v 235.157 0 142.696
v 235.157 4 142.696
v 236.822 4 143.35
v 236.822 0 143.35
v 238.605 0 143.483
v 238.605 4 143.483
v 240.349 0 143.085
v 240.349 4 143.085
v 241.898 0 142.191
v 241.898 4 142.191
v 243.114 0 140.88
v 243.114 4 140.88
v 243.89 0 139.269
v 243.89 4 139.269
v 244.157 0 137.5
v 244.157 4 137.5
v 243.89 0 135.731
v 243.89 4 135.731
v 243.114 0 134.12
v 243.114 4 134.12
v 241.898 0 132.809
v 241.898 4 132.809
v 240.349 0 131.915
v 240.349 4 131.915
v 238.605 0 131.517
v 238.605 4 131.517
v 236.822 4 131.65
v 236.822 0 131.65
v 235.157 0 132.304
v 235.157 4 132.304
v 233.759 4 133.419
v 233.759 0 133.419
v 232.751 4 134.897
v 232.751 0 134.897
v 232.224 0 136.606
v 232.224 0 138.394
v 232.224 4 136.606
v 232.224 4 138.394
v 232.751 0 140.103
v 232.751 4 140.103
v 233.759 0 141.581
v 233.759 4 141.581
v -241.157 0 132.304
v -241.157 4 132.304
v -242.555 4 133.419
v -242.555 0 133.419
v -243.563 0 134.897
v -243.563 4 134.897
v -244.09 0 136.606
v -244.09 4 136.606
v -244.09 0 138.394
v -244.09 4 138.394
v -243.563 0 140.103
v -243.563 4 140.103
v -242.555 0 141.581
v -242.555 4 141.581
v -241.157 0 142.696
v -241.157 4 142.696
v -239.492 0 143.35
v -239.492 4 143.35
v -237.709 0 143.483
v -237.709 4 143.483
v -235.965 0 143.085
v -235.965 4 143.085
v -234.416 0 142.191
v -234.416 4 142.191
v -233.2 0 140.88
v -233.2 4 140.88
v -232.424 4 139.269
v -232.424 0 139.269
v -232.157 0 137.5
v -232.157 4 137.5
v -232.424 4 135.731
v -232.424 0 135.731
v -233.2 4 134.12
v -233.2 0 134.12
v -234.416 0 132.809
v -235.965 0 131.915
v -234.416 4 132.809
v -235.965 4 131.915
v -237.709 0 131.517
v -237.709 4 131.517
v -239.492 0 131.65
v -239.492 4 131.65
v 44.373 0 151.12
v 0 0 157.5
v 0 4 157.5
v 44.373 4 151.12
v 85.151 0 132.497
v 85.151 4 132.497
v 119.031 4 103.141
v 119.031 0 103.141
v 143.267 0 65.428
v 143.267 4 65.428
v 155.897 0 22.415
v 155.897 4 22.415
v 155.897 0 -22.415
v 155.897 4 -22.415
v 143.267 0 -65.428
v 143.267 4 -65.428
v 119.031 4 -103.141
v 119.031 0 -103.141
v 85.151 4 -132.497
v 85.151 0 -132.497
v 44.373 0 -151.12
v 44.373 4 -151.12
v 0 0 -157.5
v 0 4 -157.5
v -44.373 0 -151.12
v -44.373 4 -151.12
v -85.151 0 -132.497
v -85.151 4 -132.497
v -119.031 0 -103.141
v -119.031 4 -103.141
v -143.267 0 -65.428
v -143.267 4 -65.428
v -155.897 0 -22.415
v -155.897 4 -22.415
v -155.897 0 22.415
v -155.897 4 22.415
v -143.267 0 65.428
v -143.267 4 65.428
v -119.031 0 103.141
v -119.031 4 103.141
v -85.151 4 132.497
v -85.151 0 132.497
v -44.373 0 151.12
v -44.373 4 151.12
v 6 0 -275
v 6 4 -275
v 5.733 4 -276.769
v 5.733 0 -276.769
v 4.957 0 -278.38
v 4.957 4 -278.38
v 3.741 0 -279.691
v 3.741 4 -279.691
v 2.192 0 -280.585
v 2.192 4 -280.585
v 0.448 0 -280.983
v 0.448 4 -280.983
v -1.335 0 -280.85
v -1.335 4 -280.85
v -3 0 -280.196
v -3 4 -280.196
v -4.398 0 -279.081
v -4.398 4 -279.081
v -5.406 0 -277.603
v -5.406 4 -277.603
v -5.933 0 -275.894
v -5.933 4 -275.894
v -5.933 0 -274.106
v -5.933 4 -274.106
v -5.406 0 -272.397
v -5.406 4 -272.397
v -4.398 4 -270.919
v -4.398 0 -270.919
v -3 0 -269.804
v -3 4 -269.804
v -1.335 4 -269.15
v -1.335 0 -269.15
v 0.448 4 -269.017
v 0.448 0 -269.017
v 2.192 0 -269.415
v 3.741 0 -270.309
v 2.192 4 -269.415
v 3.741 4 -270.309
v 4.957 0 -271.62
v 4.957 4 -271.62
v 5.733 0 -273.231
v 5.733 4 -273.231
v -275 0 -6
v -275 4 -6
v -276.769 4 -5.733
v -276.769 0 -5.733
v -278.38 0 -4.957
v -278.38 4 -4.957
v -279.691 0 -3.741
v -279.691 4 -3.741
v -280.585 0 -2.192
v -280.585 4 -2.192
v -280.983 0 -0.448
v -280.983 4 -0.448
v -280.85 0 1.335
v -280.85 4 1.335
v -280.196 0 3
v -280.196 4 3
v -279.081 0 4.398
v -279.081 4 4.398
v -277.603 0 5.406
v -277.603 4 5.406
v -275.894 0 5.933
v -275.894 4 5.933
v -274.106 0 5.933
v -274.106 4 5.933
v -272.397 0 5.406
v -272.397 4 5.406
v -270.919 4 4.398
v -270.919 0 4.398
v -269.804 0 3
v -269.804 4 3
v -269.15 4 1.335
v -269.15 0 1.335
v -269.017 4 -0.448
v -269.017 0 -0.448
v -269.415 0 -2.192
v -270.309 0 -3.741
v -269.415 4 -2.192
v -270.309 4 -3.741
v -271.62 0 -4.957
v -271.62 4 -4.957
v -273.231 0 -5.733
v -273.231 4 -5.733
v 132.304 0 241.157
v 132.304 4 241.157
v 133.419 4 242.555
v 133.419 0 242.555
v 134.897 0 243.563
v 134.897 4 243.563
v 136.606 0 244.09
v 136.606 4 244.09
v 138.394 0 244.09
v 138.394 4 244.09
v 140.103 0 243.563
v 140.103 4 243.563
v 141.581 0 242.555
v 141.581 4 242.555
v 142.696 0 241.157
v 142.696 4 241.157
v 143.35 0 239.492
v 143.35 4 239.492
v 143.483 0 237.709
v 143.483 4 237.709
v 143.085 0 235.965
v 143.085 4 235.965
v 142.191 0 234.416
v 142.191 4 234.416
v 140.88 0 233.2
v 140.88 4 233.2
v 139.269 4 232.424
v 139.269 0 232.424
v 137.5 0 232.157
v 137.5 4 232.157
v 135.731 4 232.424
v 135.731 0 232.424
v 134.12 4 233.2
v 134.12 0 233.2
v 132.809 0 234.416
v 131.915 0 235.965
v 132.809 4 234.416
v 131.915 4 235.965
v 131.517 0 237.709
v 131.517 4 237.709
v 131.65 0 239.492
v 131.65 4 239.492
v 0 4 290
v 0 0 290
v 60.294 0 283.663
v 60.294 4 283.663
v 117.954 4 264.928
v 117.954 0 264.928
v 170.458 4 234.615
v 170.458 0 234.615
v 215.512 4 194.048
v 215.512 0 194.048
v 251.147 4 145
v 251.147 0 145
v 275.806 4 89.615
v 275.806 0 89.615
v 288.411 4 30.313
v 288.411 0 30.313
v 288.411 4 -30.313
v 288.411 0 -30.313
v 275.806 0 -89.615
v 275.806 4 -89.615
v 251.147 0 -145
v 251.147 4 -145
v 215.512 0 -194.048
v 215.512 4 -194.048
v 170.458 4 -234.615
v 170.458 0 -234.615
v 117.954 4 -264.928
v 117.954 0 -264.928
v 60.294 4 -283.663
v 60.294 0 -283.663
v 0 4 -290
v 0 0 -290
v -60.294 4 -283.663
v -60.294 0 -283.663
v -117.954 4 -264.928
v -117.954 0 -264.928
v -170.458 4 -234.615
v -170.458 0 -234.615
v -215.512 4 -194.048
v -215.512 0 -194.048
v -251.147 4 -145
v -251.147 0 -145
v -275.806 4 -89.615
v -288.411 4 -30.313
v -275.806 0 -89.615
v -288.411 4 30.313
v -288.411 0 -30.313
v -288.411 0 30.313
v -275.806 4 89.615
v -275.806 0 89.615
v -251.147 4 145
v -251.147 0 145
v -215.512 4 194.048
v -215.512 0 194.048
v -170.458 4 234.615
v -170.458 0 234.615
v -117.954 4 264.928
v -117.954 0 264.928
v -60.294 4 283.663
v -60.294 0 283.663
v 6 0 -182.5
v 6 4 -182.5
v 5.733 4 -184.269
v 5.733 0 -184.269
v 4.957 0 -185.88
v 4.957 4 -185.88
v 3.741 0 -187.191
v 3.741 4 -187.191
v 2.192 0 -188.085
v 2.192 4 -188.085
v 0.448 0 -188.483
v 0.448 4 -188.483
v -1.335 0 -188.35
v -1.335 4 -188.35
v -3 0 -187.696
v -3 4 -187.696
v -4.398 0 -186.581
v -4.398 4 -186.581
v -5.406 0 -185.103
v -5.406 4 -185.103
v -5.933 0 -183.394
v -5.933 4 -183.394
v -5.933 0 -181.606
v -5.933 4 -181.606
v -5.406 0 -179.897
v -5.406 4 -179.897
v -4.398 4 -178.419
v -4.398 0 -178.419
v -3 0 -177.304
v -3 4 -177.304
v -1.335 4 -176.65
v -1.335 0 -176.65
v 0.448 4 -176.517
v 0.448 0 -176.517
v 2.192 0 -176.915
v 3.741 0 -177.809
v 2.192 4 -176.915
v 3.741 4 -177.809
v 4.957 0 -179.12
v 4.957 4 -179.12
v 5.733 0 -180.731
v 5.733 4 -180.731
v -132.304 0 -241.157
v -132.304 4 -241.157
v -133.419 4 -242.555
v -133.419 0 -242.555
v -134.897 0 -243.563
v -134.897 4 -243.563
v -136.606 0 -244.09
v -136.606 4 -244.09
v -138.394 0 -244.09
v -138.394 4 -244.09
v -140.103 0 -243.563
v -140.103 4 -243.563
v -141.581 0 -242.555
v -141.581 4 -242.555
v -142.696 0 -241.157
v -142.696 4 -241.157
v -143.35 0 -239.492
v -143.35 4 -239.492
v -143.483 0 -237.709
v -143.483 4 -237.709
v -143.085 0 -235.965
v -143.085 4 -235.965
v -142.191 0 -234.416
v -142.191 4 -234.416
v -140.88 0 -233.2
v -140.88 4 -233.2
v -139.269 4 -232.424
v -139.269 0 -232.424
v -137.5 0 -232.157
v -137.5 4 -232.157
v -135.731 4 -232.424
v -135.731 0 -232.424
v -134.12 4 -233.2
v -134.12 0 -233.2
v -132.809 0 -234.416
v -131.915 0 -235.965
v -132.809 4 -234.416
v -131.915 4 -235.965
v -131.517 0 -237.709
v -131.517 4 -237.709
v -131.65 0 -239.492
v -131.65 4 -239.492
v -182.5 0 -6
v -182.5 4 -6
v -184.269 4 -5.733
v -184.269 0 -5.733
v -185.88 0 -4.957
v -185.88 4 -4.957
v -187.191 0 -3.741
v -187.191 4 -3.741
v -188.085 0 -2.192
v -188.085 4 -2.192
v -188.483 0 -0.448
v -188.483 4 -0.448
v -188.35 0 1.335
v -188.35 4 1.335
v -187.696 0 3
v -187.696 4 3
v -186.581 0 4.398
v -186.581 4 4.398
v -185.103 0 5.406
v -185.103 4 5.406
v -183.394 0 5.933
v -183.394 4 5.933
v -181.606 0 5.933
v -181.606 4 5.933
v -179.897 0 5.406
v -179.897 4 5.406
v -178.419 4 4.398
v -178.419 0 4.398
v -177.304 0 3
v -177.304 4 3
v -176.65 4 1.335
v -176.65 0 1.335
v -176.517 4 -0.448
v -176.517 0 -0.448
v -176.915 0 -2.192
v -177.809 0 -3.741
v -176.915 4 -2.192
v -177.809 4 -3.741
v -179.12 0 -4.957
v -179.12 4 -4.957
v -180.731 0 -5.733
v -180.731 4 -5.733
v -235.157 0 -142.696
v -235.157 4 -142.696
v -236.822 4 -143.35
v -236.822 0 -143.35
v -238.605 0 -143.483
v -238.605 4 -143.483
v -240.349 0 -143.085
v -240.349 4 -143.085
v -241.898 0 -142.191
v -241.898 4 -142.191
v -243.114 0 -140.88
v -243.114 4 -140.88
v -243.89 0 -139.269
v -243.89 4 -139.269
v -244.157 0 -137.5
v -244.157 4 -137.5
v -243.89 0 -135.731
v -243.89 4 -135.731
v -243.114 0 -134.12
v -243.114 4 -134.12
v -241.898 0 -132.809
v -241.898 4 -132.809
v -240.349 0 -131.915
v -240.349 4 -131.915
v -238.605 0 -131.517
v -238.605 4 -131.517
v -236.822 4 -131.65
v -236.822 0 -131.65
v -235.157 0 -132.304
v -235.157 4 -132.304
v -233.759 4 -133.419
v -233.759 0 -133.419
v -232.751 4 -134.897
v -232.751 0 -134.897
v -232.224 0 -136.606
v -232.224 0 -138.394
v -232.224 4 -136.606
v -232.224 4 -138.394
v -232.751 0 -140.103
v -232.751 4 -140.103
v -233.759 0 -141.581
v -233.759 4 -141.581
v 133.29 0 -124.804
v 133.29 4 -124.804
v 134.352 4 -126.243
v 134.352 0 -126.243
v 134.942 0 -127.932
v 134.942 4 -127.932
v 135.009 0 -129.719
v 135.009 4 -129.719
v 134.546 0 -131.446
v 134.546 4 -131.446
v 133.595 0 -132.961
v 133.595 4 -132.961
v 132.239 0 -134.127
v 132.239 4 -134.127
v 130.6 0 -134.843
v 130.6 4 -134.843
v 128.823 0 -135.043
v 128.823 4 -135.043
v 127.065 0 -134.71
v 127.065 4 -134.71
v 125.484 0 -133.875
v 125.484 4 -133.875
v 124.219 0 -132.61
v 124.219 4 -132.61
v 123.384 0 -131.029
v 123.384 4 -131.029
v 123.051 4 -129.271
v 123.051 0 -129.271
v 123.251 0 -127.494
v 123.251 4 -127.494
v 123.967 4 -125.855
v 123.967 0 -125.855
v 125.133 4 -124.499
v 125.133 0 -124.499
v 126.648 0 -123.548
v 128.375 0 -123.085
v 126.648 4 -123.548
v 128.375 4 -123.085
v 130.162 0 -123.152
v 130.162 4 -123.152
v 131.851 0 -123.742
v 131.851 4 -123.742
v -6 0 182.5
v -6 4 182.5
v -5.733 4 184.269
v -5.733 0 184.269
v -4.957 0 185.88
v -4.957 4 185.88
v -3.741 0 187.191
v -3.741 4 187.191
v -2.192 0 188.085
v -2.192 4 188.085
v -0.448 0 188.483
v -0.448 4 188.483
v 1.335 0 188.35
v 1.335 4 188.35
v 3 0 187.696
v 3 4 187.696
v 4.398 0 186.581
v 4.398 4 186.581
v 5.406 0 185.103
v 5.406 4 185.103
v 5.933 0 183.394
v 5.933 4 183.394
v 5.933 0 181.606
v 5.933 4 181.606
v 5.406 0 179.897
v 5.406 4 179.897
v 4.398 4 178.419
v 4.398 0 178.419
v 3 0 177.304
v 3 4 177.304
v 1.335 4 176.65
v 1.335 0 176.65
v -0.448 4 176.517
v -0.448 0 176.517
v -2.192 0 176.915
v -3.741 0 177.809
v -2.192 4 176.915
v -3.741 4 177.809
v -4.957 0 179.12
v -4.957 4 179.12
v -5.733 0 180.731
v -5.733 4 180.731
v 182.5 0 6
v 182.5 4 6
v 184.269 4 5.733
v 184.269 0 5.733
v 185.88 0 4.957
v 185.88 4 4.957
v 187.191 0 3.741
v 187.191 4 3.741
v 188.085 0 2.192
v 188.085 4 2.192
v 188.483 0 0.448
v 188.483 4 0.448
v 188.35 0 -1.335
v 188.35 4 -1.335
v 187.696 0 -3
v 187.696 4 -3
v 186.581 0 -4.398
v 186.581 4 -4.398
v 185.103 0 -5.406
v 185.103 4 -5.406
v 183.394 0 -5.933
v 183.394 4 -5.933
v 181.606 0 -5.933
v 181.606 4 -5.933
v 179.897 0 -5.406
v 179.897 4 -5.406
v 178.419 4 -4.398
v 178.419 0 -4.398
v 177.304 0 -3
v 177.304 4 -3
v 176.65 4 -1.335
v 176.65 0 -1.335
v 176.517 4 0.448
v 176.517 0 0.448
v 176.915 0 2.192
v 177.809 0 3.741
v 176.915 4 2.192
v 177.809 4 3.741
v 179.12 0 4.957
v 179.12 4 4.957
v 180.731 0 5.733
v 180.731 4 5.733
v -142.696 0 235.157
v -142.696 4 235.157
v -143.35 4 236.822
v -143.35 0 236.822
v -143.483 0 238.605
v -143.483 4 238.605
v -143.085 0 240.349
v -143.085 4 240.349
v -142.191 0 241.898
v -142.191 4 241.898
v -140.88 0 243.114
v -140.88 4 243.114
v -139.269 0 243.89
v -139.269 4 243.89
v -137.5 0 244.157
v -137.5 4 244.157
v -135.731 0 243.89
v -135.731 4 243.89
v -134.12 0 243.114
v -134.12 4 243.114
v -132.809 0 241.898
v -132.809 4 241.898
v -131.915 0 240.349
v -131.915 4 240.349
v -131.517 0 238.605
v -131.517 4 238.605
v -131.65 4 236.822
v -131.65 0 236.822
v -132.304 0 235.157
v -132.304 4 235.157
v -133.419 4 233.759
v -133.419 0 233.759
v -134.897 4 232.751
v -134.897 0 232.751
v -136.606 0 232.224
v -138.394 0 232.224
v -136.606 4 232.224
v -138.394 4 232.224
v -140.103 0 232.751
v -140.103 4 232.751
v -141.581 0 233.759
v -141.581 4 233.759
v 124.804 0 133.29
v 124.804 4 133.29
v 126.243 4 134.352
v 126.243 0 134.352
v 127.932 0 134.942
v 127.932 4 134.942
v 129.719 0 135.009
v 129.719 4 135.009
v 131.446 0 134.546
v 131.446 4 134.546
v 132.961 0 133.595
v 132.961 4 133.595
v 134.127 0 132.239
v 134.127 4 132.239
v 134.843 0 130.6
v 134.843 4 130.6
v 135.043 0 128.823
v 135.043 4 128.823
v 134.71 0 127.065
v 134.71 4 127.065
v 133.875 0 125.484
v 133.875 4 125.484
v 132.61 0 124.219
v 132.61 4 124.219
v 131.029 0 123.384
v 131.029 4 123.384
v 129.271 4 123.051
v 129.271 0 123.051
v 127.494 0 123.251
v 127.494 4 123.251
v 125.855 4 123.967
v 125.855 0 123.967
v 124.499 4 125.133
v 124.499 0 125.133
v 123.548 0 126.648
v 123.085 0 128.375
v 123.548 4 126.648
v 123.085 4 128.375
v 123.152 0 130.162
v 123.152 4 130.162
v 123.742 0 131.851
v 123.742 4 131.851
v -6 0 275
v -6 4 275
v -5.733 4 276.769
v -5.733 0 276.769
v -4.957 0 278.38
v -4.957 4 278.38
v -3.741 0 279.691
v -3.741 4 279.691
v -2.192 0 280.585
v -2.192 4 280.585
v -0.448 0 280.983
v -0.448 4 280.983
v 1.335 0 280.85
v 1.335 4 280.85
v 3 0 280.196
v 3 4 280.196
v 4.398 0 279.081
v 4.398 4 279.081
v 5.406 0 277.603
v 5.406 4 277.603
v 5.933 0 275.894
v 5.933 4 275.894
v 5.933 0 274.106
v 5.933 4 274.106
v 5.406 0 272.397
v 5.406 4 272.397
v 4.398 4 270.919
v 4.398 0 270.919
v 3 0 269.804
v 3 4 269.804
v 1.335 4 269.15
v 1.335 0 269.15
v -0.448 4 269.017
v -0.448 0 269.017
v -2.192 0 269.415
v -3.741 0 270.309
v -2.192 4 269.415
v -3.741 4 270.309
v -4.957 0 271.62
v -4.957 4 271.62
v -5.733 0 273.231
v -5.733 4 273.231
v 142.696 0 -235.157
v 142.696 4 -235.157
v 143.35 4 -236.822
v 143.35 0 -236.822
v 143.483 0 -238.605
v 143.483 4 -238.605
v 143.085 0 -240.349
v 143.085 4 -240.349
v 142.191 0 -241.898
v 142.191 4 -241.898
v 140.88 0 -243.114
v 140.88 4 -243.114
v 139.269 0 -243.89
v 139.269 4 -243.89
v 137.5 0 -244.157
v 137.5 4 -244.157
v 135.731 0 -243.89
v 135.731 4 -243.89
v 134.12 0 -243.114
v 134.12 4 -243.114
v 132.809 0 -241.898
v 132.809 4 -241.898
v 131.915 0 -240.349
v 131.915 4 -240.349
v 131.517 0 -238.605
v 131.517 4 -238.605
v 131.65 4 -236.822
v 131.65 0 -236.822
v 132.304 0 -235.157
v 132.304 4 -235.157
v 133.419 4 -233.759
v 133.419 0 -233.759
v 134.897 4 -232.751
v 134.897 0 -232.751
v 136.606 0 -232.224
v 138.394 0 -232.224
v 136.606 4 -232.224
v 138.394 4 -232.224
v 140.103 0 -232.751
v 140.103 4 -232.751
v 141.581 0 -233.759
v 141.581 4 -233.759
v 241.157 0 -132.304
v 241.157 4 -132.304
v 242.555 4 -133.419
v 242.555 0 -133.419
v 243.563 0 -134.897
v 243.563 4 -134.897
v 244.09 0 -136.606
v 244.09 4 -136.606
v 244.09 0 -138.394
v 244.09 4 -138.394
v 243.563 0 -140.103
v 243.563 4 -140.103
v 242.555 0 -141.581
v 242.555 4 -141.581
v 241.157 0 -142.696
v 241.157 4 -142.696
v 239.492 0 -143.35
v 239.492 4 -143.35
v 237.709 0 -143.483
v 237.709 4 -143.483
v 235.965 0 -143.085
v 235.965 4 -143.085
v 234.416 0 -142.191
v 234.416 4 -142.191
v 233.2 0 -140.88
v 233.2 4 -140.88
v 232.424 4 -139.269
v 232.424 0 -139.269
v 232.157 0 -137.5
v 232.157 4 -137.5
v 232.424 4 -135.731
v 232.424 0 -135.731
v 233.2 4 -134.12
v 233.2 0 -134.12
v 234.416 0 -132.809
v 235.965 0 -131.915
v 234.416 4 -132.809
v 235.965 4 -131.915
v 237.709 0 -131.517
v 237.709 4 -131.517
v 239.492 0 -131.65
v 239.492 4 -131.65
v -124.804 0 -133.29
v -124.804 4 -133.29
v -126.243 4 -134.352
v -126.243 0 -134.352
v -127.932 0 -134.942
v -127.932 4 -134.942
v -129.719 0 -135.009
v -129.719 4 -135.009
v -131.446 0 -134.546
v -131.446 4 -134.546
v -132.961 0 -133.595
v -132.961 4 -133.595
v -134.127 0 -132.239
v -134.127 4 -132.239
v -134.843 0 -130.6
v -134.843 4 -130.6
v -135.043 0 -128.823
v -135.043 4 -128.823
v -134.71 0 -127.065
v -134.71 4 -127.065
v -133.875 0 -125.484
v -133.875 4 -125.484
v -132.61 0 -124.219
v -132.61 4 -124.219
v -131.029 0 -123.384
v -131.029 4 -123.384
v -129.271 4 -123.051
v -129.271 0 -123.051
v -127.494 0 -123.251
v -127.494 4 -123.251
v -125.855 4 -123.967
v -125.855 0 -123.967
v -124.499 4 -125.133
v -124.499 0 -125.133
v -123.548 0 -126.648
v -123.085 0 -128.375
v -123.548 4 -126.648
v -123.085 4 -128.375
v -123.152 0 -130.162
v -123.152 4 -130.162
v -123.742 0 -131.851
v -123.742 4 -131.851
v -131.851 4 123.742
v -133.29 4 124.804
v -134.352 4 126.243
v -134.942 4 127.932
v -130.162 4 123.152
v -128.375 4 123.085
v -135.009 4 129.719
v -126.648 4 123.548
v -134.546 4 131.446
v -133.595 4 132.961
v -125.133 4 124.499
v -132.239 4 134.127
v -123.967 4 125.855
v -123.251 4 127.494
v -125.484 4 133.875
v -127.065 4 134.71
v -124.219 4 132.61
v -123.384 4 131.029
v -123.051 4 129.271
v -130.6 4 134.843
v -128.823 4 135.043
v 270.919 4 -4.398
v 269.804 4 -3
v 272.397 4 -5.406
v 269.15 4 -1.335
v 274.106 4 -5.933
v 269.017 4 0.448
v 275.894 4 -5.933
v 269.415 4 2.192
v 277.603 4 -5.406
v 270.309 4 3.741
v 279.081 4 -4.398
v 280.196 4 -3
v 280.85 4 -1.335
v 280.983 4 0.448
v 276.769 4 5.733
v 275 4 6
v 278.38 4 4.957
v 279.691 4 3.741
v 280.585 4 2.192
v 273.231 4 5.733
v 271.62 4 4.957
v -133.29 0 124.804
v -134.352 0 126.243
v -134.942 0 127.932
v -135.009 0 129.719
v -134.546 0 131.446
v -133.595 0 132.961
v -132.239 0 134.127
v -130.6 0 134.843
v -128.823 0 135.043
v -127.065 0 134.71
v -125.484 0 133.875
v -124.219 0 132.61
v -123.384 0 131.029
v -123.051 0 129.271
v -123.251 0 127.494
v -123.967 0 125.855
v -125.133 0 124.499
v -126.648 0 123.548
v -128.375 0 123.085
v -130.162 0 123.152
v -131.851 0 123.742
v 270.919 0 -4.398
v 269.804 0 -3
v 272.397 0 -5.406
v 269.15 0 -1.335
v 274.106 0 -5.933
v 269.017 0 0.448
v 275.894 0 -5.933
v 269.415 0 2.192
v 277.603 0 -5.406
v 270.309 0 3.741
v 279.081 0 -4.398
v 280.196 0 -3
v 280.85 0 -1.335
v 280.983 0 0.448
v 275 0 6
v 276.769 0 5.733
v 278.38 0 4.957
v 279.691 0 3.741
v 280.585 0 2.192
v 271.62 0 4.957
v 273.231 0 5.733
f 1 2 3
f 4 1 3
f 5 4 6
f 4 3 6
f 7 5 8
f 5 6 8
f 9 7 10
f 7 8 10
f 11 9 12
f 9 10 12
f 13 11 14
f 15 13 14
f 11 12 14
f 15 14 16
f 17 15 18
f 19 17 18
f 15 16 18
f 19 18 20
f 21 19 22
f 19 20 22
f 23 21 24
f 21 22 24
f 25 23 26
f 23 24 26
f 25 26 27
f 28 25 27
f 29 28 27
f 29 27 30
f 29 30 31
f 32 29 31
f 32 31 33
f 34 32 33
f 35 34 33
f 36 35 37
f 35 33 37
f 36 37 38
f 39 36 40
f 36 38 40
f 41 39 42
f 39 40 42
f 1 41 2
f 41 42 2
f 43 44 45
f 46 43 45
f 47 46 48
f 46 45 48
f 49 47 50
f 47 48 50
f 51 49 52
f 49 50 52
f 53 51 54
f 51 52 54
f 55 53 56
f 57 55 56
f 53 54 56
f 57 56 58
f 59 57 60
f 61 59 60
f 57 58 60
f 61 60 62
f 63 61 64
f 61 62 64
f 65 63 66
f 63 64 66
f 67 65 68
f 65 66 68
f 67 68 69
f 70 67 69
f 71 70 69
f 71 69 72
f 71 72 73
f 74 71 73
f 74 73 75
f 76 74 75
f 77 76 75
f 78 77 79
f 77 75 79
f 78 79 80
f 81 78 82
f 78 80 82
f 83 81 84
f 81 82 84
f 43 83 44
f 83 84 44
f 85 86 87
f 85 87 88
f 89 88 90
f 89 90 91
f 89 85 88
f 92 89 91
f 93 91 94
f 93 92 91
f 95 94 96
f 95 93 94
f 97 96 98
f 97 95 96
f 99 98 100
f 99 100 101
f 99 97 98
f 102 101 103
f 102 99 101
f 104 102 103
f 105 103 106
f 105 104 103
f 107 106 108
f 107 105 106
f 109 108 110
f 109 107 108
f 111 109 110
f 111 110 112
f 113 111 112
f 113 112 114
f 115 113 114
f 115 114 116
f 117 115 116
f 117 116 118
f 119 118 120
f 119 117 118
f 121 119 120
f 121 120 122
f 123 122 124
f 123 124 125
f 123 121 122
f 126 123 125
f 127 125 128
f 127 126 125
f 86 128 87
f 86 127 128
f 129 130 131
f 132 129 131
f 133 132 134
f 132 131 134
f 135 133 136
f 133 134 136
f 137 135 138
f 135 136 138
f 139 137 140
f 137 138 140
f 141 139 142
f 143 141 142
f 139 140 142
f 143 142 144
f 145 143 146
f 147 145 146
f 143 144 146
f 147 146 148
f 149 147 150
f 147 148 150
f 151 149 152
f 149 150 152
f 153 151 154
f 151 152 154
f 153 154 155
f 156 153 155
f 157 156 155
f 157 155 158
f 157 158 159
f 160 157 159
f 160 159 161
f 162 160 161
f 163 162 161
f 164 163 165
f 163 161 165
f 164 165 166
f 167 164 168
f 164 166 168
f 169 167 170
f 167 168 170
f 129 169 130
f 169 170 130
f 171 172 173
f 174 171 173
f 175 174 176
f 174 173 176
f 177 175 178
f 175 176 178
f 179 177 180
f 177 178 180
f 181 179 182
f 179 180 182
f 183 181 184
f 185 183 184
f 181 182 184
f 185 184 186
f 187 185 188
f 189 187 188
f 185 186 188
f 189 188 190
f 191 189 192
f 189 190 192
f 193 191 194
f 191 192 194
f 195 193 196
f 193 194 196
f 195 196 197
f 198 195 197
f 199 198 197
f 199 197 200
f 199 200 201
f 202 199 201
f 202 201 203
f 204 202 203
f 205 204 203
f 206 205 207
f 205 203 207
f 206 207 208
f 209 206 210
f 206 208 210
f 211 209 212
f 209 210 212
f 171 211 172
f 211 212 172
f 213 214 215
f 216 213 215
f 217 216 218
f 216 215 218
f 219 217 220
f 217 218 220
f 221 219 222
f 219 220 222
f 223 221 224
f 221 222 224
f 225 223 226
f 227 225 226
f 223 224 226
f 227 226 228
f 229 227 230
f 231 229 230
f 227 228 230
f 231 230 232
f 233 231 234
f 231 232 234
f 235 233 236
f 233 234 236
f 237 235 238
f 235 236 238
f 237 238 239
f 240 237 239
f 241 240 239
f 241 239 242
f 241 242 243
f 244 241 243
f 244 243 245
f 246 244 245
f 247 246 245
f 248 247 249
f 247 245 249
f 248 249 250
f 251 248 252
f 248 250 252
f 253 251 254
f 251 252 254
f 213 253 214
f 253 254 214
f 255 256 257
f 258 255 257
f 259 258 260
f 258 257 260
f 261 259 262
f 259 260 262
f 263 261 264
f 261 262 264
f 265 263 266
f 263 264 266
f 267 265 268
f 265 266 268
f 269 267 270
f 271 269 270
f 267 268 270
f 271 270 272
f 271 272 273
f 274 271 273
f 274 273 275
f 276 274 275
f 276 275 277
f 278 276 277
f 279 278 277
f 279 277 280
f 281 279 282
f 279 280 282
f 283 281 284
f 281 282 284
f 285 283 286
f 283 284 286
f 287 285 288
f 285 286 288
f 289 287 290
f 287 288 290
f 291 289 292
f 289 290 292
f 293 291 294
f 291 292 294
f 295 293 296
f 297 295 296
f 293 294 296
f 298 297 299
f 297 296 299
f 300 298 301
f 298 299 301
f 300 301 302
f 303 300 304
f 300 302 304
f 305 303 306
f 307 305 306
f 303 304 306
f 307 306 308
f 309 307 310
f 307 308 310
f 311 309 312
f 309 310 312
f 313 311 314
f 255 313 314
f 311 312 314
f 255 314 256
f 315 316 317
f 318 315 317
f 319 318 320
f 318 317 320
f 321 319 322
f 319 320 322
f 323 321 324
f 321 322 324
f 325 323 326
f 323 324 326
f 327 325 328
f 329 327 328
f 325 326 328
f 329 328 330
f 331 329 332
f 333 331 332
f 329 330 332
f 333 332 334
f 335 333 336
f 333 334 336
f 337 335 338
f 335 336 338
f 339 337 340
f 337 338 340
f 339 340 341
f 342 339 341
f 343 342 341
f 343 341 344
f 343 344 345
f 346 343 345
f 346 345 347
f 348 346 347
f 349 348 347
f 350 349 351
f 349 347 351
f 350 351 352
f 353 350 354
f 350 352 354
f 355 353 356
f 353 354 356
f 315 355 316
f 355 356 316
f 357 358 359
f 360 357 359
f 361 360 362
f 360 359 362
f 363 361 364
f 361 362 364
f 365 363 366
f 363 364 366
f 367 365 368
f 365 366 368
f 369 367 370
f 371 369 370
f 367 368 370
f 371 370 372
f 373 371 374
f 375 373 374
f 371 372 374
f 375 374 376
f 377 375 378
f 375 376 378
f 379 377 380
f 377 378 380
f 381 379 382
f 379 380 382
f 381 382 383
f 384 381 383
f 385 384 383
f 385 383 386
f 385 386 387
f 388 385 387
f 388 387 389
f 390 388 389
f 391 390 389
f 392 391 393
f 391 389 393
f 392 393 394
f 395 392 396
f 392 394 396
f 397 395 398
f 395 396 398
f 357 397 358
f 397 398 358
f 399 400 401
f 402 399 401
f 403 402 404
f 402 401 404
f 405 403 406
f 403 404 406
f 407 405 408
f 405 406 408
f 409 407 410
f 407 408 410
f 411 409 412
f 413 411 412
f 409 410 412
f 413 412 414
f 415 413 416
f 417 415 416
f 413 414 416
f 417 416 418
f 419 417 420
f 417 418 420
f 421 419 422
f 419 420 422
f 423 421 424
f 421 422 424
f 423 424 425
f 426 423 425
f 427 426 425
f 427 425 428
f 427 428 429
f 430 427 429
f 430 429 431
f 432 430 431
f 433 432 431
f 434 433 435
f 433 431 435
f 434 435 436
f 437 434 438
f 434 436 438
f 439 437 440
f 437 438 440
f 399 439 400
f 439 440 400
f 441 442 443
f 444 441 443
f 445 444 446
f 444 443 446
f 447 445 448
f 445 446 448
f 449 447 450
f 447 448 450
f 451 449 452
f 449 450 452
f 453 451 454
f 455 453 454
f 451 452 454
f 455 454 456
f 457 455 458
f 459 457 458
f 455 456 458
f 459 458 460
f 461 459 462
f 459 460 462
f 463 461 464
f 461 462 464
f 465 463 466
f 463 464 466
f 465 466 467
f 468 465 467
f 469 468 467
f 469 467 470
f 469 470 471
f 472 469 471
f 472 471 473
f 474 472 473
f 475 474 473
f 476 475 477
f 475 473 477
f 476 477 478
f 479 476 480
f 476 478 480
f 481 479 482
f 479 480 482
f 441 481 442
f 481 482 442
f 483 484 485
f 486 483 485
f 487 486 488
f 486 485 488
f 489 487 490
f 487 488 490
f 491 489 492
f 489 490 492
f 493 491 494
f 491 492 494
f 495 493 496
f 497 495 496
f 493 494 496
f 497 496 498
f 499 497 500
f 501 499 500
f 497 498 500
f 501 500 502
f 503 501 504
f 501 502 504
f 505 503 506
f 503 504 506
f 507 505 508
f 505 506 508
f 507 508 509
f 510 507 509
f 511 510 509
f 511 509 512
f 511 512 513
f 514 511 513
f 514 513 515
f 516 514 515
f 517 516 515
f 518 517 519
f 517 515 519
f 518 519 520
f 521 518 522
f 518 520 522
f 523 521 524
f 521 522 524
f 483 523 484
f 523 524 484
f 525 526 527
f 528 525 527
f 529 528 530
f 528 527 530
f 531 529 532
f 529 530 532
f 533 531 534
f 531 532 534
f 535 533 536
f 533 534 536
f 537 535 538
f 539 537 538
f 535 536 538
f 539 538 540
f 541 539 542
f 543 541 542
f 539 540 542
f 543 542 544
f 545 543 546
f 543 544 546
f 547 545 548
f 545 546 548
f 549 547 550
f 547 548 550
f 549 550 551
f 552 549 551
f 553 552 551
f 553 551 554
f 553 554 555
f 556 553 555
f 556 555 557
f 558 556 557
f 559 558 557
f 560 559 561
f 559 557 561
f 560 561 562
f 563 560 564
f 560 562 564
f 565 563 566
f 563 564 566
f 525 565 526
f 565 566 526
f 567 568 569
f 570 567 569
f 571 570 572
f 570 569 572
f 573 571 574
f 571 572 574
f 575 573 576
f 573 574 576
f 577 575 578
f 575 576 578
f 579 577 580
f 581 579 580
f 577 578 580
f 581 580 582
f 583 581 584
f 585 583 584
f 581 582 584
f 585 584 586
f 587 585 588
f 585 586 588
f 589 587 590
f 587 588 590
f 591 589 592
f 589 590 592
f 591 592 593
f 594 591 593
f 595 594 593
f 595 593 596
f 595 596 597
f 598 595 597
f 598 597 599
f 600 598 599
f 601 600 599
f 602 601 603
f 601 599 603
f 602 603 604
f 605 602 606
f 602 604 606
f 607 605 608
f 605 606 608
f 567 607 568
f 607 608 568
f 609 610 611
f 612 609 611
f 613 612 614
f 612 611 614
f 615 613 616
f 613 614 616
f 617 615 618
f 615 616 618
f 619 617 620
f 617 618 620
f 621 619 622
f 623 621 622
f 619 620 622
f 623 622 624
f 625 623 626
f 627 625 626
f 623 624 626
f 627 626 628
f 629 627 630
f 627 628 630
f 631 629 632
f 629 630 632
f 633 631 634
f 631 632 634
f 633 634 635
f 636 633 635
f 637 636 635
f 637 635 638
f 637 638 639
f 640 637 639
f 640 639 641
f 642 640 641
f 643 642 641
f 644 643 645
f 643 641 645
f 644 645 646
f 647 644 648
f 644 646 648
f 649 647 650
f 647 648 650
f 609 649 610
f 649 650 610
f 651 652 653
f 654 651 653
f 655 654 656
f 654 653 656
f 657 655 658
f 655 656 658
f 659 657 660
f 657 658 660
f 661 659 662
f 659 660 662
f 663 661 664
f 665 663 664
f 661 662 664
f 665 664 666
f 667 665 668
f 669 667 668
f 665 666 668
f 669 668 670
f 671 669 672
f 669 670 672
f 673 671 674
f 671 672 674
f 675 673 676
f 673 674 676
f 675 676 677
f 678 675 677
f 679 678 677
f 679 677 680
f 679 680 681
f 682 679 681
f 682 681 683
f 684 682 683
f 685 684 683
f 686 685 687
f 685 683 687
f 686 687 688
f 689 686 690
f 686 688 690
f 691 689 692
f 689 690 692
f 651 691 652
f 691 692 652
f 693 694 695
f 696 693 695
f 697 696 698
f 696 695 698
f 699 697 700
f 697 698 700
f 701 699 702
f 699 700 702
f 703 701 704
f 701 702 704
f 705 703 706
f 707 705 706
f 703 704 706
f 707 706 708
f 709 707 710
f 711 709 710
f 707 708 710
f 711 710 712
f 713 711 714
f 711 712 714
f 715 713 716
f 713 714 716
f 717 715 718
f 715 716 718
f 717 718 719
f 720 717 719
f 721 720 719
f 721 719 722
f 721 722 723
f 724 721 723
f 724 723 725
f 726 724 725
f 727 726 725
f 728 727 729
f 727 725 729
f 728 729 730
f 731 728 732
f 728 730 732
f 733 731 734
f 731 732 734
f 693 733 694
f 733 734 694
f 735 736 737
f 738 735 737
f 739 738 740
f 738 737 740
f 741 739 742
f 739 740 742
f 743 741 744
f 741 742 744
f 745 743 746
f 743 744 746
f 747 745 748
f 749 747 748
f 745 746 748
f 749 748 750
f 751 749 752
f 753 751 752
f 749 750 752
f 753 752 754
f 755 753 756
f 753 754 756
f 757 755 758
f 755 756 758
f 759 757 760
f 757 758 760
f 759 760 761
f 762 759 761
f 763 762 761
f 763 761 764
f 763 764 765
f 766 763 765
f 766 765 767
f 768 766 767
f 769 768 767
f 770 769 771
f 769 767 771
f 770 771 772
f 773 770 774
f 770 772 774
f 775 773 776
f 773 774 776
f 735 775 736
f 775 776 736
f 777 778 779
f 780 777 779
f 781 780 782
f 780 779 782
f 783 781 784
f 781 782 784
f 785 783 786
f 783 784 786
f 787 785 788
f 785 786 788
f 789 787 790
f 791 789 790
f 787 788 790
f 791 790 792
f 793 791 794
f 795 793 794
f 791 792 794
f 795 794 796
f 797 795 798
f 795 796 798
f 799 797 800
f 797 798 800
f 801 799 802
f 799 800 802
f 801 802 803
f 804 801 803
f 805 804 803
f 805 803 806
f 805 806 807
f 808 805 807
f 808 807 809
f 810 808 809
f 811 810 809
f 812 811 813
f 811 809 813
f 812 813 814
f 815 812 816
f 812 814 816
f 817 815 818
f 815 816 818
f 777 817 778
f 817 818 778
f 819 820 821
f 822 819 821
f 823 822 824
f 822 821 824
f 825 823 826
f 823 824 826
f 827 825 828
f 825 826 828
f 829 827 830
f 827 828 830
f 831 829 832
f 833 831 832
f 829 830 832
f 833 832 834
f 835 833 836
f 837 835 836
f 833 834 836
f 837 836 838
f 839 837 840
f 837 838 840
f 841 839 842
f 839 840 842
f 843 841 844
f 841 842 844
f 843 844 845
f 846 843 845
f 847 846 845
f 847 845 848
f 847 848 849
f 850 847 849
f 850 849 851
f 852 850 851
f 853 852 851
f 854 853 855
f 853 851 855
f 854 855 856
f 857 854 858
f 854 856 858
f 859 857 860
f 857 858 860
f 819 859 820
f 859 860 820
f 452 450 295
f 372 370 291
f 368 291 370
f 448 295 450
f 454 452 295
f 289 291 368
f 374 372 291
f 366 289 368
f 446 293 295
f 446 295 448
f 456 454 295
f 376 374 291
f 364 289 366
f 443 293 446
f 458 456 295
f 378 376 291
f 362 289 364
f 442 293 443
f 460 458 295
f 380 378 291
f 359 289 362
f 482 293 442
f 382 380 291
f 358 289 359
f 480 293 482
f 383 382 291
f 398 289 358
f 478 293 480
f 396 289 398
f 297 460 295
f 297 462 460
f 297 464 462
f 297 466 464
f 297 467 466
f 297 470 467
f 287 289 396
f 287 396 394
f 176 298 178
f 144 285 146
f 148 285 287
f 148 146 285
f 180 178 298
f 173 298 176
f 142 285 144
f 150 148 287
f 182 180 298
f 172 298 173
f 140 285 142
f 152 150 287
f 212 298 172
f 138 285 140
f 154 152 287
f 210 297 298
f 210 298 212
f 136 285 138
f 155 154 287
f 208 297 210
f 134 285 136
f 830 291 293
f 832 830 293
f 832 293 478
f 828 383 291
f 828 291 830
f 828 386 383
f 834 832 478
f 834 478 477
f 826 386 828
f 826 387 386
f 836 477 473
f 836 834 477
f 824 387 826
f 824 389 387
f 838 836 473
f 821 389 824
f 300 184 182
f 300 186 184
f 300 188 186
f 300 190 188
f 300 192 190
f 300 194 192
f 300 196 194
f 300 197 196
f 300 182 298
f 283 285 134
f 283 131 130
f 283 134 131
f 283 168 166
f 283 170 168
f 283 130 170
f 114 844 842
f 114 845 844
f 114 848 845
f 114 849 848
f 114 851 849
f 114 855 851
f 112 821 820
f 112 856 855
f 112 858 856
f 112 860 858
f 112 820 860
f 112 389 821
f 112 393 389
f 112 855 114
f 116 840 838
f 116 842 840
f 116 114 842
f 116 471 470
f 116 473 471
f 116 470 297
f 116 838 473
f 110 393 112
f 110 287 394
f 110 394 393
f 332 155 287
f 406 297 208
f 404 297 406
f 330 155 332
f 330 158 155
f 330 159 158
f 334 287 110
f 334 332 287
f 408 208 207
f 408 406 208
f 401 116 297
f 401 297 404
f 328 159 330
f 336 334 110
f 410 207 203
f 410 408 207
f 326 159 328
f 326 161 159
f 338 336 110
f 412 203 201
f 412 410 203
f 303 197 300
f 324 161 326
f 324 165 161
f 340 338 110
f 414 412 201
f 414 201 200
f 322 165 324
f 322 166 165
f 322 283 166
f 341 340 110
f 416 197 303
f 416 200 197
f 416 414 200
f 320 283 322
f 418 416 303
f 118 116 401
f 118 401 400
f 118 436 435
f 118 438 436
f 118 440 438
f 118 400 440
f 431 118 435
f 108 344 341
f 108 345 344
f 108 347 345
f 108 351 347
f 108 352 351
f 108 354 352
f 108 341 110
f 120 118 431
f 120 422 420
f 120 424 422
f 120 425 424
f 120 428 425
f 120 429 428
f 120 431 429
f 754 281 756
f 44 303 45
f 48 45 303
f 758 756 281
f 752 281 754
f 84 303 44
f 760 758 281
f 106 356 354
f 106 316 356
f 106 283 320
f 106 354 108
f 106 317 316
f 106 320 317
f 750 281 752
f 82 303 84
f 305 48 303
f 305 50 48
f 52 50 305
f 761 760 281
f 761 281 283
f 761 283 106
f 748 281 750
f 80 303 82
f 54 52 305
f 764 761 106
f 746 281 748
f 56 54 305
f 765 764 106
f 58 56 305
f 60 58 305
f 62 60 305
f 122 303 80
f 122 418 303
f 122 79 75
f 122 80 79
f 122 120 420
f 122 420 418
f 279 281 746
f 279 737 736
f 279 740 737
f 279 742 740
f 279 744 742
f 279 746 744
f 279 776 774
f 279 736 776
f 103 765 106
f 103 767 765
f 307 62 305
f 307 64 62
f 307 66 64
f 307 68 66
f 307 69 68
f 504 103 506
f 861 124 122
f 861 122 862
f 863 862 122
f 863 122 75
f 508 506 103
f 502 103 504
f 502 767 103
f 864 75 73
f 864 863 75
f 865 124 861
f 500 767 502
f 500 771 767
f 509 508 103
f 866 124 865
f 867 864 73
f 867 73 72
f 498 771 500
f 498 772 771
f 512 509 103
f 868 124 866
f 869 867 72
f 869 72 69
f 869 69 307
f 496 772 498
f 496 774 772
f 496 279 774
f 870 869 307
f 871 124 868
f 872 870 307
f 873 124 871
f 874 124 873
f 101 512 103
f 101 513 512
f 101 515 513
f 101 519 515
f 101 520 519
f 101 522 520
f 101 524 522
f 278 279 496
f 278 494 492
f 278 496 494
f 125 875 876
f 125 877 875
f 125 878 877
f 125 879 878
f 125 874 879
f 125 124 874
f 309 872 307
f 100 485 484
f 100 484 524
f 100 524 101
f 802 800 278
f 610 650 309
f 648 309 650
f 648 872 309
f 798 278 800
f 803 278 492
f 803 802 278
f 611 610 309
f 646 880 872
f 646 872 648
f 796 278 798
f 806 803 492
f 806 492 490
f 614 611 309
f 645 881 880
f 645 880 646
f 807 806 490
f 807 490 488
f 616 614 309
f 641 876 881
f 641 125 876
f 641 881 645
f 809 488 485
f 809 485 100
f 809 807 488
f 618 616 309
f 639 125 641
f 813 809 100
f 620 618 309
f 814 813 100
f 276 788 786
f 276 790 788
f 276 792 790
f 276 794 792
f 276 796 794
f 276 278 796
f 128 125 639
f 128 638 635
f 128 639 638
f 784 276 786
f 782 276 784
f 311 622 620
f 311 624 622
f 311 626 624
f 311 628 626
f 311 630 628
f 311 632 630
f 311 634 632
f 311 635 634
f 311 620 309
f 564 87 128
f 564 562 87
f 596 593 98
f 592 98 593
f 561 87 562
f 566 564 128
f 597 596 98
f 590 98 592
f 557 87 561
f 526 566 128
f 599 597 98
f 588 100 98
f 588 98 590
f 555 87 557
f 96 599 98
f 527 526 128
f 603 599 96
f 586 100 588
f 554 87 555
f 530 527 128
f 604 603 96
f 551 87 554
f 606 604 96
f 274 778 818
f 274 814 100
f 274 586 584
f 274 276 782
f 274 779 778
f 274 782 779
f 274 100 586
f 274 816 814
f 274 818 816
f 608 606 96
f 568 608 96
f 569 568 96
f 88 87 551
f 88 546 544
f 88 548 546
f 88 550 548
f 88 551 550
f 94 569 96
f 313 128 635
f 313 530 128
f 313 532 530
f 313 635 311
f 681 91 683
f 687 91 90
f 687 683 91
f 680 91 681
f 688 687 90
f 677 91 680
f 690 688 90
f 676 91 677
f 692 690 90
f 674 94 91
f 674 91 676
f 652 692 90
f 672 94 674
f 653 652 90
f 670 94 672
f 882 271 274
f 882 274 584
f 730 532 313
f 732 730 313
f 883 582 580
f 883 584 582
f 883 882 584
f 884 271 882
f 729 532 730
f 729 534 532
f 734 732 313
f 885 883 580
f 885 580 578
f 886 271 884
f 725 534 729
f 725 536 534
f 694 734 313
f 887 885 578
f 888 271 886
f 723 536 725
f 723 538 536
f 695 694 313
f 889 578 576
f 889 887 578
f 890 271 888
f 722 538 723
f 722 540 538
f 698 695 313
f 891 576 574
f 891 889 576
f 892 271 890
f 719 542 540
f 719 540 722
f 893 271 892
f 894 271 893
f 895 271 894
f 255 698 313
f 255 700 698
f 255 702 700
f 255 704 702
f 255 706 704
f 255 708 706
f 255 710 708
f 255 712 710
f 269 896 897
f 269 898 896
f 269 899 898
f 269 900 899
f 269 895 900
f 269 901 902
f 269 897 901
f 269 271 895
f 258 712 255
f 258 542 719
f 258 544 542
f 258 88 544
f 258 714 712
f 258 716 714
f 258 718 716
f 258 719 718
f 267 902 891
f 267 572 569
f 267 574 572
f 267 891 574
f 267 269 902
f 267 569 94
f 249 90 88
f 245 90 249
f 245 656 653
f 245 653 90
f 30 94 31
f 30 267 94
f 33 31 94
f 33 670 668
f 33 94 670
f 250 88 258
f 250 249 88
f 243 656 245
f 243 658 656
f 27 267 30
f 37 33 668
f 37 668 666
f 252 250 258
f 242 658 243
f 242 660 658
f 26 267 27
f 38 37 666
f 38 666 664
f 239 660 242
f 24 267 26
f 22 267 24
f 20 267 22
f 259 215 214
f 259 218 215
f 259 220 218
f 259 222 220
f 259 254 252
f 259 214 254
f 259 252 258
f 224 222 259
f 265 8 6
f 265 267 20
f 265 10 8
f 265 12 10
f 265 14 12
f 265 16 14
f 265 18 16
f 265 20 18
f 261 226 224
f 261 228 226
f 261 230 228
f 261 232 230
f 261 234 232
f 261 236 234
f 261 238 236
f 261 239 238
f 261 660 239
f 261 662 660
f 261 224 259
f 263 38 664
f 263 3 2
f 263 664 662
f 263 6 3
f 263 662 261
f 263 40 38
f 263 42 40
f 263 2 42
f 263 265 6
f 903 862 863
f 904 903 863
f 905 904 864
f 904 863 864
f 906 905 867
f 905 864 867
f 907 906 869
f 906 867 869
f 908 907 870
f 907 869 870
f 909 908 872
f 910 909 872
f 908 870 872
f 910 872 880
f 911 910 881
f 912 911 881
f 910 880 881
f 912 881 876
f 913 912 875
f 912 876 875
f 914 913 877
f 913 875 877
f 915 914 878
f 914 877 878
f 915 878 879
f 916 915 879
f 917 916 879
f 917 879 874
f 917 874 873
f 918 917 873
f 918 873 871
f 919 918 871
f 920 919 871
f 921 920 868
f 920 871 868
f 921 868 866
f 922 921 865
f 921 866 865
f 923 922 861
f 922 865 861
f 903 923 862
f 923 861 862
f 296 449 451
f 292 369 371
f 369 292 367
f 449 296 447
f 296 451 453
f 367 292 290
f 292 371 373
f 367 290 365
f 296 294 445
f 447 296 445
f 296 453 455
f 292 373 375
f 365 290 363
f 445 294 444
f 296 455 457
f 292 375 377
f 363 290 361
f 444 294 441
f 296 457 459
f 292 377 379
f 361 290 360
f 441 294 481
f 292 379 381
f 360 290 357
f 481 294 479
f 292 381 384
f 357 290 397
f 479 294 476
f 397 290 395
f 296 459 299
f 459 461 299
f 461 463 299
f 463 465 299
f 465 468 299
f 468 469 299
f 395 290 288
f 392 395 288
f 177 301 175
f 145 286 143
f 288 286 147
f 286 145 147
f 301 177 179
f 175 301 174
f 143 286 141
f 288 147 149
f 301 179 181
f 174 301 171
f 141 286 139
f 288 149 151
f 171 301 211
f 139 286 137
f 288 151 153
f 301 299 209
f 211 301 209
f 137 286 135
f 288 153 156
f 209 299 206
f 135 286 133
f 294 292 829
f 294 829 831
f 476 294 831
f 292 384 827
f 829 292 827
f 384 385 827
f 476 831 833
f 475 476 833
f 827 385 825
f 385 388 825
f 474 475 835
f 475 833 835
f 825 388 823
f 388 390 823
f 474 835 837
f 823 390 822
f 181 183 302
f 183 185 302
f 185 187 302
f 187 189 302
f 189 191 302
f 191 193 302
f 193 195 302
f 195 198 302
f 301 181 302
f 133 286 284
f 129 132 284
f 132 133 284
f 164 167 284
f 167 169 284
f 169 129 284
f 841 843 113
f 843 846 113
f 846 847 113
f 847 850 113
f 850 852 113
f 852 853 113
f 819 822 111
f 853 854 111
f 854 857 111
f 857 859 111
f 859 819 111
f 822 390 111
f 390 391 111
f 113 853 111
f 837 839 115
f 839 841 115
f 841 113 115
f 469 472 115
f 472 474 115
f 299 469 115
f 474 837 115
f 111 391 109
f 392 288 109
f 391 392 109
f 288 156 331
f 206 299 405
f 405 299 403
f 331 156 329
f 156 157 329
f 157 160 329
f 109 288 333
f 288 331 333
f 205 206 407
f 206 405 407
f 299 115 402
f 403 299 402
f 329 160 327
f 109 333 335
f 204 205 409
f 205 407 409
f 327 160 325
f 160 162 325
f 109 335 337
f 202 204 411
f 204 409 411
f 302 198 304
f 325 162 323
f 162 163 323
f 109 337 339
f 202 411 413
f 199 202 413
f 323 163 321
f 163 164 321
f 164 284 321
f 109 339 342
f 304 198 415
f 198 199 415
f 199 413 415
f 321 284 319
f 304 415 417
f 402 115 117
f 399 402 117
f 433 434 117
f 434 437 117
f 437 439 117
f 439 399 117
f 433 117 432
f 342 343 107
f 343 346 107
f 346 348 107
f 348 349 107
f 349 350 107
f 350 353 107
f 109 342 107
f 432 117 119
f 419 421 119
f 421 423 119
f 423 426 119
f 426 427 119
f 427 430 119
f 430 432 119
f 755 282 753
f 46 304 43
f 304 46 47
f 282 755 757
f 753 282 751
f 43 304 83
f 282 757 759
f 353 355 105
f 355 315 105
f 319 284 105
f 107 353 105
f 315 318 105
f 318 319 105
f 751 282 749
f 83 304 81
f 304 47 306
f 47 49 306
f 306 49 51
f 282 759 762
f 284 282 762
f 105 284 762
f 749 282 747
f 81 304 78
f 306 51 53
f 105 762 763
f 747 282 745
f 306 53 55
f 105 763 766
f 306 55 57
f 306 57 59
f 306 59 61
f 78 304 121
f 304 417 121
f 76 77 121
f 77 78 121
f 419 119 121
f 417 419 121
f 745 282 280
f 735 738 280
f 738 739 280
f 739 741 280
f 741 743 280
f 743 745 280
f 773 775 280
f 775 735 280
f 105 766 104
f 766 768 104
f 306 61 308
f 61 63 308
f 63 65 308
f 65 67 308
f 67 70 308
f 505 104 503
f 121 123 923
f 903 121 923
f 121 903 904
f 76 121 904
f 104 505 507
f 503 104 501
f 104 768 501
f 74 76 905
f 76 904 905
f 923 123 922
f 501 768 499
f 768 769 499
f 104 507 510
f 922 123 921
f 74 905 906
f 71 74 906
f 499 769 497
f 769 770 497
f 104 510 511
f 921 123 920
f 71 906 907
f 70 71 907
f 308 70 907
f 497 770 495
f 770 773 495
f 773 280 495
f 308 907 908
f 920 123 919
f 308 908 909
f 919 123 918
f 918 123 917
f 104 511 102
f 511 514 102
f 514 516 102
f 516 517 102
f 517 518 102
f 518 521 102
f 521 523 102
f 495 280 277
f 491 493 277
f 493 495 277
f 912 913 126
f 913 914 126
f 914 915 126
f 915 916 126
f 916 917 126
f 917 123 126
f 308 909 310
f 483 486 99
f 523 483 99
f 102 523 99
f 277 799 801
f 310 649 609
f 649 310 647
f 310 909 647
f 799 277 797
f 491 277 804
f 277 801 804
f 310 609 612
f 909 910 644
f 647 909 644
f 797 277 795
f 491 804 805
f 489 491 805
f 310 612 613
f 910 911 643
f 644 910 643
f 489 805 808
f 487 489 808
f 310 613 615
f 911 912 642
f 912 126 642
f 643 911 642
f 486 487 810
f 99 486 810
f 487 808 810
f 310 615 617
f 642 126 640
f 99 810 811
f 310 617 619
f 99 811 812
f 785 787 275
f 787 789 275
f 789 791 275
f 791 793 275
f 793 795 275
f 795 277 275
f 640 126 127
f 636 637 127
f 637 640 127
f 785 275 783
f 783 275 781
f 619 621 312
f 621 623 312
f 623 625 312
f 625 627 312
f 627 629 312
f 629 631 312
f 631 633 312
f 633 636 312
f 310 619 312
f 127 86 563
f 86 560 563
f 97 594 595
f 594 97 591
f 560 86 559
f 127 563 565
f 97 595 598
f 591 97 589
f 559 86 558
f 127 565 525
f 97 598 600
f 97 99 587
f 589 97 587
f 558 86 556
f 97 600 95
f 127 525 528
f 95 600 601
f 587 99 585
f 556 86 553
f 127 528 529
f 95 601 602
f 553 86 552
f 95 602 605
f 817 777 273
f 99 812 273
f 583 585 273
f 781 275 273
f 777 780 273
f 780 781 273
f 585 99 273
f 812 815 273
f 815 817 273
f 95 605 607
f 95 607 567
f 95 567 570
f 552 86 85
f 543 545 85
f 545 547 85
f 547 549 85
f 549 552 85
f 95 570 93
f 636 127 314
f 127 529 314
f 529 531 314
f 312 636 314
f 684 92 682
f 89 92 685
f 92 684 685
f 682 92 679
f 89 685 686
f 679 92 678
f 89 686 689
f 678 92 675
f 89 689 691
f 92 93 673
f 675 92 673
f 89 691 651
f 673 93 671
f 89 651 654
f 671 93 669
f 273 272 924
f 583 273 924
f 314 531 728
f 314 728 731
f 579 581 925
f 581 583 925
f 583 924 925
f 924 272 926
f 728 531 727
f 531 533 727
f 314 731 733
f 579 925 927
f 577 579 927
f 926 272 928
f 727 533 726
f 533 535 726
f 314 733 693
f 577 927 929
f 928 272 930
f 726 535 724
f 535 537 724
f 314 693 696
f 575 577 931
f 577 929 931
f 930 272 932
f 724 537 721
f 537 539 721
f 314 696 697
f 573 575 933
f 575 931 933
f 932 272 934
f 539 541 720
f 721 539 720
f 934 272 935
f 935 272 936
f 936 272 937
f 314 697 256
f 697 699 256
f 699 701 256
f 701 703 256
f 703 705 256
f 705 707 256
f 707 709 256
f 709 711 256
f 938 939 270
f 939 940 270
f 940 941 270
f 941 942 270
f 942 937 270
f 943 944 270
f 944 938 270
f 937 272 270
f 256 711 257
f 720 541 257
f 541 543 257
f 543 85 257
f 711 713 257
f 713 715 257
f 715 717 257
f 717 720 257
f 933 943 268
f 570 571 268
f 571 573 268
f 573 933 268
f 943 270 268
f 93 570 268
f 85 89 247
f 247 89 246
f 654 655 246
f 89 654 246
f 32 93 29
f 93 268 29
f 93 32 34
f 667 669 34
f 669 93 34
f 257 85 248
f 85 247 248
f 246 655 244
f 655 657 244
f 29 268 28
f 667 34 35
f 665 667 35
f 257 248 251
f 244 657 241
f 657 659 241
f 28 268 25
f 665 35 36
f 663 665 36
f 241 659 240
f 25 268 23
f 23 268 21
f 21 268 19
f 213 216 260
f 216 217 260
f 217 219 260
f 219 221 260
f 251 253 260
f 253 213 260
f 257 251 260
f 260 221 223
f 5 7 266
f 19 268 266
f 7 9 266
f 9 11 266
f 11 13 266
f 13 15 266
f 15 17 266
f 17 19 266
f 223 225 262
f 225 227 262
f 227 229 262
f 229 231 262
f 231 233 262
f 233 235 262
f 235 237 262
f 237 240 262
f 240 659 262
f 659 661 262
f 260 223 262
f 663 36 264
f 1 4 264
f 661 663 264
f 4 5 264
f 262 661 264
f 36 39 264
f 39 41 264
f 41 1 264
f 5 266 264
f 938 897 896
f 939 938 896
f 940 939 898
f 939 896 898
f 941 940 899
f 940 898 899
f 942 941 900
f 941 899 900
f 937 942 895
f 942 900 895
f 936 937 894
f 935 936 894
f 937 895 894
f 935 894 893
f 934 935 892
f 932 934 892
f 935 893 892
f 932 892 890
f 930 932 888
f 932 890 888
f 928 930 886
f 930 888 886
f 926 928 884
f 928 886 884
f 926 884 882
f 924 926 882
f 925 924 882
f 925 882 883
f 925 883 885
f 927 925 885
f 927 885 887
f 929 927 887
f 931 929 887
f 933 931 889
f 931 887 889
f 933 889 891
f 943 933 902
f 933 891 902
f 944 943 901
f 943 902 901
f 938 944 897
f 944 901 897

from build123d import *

# Parameters (mm, degrees)
SKETCH1_R           = 290
SKETCH1_R_2         = 157.5
BOSS_EXTRUDE1_DEPTH = 4
SKETCH2_R           = 6
CUT_EXTRUDE1_DEPTH  = 4
CIRPATTERN1_COUNT   = 8
SKETCH3_R           = 6
CUT_EXTRUDE2_DEPTH  = 4
CIRPATTERN2_COUNT   = 12


with BuildPart() as part:
    # Sketch1 → Boss-Extrude1 (new body)
    with BuildSketch(Plane(origin=(0, 0, 0), x_dir=(1, 0, 0), z_dir=(0, 1, 0))):
        with Locations(Location((0, 0, 0), (0, 0, 270))):
            Circle(SKETCH1_R)
        with Locations(Location((0, 0, 0), (0, 0, 270))):
            Circle(SKETCH1_R_2, mode=Mode.SUBTRACT)
    extrude(amount=BOSS_EXTRUDE1_DEPTH)

    # Sketch2 → Cut-Extrude1 (cut)
    with BuildSketch(Plane(origin=(0, 4, 0), x_dir=(1, 0, 0), z_dir=(0, 1, 0))):
        with Locations(Location((182.5, 0, 0), (0, 0, 270))):
            Circle(SKETCH2_R)
    cut_extrude1 = extrude(amount=-CUT_EXTRUDE1_DEPTH, mode=Mode.SUBTRACT)

    # CirPattern1: Cut-Extrude1 ×8 about axis
    cirpattern1_axis = Axis((0, 0, 0), (0, 1, 0))
    for i in range(1, CIRPATTERN1_COUNT):
        add(cut_extrude1.rotate(cirpattern1_axis, i * 360 / CIRPATTERN1_COUNT), mode=Mode.SUBTRACT)

    # Sketch3 → Cut-Extrude2 (cut)
    with BuildSketch(Plane(origin=(0, 4, 0), x_dir=(1, 0, 0), z_dir=(0, 1, 0))):
        with Locations(Location((275, 0, 0), (0, 0, 270))):
            Circle(SKETCH3_R)
    cut_extrude2 = extrude(amount=-CUT_EXTRUDE2_DEPTH, mode=Mode.SUBTRACT)

    # CirPattern2: Cut-Extrude2 ×12 about axis
    cirpattern2_axis = Axis((0, 0, 0), (0, 1, 0))
    for i in range(1, CIRPATTERN2_COUNT):
        add(cut_extrude2.rotate(cirpattern2_axis, i * 360 / CIRPATTERN2_COUNT), mode=Mode.SUBTRACT)


solid = part.part
